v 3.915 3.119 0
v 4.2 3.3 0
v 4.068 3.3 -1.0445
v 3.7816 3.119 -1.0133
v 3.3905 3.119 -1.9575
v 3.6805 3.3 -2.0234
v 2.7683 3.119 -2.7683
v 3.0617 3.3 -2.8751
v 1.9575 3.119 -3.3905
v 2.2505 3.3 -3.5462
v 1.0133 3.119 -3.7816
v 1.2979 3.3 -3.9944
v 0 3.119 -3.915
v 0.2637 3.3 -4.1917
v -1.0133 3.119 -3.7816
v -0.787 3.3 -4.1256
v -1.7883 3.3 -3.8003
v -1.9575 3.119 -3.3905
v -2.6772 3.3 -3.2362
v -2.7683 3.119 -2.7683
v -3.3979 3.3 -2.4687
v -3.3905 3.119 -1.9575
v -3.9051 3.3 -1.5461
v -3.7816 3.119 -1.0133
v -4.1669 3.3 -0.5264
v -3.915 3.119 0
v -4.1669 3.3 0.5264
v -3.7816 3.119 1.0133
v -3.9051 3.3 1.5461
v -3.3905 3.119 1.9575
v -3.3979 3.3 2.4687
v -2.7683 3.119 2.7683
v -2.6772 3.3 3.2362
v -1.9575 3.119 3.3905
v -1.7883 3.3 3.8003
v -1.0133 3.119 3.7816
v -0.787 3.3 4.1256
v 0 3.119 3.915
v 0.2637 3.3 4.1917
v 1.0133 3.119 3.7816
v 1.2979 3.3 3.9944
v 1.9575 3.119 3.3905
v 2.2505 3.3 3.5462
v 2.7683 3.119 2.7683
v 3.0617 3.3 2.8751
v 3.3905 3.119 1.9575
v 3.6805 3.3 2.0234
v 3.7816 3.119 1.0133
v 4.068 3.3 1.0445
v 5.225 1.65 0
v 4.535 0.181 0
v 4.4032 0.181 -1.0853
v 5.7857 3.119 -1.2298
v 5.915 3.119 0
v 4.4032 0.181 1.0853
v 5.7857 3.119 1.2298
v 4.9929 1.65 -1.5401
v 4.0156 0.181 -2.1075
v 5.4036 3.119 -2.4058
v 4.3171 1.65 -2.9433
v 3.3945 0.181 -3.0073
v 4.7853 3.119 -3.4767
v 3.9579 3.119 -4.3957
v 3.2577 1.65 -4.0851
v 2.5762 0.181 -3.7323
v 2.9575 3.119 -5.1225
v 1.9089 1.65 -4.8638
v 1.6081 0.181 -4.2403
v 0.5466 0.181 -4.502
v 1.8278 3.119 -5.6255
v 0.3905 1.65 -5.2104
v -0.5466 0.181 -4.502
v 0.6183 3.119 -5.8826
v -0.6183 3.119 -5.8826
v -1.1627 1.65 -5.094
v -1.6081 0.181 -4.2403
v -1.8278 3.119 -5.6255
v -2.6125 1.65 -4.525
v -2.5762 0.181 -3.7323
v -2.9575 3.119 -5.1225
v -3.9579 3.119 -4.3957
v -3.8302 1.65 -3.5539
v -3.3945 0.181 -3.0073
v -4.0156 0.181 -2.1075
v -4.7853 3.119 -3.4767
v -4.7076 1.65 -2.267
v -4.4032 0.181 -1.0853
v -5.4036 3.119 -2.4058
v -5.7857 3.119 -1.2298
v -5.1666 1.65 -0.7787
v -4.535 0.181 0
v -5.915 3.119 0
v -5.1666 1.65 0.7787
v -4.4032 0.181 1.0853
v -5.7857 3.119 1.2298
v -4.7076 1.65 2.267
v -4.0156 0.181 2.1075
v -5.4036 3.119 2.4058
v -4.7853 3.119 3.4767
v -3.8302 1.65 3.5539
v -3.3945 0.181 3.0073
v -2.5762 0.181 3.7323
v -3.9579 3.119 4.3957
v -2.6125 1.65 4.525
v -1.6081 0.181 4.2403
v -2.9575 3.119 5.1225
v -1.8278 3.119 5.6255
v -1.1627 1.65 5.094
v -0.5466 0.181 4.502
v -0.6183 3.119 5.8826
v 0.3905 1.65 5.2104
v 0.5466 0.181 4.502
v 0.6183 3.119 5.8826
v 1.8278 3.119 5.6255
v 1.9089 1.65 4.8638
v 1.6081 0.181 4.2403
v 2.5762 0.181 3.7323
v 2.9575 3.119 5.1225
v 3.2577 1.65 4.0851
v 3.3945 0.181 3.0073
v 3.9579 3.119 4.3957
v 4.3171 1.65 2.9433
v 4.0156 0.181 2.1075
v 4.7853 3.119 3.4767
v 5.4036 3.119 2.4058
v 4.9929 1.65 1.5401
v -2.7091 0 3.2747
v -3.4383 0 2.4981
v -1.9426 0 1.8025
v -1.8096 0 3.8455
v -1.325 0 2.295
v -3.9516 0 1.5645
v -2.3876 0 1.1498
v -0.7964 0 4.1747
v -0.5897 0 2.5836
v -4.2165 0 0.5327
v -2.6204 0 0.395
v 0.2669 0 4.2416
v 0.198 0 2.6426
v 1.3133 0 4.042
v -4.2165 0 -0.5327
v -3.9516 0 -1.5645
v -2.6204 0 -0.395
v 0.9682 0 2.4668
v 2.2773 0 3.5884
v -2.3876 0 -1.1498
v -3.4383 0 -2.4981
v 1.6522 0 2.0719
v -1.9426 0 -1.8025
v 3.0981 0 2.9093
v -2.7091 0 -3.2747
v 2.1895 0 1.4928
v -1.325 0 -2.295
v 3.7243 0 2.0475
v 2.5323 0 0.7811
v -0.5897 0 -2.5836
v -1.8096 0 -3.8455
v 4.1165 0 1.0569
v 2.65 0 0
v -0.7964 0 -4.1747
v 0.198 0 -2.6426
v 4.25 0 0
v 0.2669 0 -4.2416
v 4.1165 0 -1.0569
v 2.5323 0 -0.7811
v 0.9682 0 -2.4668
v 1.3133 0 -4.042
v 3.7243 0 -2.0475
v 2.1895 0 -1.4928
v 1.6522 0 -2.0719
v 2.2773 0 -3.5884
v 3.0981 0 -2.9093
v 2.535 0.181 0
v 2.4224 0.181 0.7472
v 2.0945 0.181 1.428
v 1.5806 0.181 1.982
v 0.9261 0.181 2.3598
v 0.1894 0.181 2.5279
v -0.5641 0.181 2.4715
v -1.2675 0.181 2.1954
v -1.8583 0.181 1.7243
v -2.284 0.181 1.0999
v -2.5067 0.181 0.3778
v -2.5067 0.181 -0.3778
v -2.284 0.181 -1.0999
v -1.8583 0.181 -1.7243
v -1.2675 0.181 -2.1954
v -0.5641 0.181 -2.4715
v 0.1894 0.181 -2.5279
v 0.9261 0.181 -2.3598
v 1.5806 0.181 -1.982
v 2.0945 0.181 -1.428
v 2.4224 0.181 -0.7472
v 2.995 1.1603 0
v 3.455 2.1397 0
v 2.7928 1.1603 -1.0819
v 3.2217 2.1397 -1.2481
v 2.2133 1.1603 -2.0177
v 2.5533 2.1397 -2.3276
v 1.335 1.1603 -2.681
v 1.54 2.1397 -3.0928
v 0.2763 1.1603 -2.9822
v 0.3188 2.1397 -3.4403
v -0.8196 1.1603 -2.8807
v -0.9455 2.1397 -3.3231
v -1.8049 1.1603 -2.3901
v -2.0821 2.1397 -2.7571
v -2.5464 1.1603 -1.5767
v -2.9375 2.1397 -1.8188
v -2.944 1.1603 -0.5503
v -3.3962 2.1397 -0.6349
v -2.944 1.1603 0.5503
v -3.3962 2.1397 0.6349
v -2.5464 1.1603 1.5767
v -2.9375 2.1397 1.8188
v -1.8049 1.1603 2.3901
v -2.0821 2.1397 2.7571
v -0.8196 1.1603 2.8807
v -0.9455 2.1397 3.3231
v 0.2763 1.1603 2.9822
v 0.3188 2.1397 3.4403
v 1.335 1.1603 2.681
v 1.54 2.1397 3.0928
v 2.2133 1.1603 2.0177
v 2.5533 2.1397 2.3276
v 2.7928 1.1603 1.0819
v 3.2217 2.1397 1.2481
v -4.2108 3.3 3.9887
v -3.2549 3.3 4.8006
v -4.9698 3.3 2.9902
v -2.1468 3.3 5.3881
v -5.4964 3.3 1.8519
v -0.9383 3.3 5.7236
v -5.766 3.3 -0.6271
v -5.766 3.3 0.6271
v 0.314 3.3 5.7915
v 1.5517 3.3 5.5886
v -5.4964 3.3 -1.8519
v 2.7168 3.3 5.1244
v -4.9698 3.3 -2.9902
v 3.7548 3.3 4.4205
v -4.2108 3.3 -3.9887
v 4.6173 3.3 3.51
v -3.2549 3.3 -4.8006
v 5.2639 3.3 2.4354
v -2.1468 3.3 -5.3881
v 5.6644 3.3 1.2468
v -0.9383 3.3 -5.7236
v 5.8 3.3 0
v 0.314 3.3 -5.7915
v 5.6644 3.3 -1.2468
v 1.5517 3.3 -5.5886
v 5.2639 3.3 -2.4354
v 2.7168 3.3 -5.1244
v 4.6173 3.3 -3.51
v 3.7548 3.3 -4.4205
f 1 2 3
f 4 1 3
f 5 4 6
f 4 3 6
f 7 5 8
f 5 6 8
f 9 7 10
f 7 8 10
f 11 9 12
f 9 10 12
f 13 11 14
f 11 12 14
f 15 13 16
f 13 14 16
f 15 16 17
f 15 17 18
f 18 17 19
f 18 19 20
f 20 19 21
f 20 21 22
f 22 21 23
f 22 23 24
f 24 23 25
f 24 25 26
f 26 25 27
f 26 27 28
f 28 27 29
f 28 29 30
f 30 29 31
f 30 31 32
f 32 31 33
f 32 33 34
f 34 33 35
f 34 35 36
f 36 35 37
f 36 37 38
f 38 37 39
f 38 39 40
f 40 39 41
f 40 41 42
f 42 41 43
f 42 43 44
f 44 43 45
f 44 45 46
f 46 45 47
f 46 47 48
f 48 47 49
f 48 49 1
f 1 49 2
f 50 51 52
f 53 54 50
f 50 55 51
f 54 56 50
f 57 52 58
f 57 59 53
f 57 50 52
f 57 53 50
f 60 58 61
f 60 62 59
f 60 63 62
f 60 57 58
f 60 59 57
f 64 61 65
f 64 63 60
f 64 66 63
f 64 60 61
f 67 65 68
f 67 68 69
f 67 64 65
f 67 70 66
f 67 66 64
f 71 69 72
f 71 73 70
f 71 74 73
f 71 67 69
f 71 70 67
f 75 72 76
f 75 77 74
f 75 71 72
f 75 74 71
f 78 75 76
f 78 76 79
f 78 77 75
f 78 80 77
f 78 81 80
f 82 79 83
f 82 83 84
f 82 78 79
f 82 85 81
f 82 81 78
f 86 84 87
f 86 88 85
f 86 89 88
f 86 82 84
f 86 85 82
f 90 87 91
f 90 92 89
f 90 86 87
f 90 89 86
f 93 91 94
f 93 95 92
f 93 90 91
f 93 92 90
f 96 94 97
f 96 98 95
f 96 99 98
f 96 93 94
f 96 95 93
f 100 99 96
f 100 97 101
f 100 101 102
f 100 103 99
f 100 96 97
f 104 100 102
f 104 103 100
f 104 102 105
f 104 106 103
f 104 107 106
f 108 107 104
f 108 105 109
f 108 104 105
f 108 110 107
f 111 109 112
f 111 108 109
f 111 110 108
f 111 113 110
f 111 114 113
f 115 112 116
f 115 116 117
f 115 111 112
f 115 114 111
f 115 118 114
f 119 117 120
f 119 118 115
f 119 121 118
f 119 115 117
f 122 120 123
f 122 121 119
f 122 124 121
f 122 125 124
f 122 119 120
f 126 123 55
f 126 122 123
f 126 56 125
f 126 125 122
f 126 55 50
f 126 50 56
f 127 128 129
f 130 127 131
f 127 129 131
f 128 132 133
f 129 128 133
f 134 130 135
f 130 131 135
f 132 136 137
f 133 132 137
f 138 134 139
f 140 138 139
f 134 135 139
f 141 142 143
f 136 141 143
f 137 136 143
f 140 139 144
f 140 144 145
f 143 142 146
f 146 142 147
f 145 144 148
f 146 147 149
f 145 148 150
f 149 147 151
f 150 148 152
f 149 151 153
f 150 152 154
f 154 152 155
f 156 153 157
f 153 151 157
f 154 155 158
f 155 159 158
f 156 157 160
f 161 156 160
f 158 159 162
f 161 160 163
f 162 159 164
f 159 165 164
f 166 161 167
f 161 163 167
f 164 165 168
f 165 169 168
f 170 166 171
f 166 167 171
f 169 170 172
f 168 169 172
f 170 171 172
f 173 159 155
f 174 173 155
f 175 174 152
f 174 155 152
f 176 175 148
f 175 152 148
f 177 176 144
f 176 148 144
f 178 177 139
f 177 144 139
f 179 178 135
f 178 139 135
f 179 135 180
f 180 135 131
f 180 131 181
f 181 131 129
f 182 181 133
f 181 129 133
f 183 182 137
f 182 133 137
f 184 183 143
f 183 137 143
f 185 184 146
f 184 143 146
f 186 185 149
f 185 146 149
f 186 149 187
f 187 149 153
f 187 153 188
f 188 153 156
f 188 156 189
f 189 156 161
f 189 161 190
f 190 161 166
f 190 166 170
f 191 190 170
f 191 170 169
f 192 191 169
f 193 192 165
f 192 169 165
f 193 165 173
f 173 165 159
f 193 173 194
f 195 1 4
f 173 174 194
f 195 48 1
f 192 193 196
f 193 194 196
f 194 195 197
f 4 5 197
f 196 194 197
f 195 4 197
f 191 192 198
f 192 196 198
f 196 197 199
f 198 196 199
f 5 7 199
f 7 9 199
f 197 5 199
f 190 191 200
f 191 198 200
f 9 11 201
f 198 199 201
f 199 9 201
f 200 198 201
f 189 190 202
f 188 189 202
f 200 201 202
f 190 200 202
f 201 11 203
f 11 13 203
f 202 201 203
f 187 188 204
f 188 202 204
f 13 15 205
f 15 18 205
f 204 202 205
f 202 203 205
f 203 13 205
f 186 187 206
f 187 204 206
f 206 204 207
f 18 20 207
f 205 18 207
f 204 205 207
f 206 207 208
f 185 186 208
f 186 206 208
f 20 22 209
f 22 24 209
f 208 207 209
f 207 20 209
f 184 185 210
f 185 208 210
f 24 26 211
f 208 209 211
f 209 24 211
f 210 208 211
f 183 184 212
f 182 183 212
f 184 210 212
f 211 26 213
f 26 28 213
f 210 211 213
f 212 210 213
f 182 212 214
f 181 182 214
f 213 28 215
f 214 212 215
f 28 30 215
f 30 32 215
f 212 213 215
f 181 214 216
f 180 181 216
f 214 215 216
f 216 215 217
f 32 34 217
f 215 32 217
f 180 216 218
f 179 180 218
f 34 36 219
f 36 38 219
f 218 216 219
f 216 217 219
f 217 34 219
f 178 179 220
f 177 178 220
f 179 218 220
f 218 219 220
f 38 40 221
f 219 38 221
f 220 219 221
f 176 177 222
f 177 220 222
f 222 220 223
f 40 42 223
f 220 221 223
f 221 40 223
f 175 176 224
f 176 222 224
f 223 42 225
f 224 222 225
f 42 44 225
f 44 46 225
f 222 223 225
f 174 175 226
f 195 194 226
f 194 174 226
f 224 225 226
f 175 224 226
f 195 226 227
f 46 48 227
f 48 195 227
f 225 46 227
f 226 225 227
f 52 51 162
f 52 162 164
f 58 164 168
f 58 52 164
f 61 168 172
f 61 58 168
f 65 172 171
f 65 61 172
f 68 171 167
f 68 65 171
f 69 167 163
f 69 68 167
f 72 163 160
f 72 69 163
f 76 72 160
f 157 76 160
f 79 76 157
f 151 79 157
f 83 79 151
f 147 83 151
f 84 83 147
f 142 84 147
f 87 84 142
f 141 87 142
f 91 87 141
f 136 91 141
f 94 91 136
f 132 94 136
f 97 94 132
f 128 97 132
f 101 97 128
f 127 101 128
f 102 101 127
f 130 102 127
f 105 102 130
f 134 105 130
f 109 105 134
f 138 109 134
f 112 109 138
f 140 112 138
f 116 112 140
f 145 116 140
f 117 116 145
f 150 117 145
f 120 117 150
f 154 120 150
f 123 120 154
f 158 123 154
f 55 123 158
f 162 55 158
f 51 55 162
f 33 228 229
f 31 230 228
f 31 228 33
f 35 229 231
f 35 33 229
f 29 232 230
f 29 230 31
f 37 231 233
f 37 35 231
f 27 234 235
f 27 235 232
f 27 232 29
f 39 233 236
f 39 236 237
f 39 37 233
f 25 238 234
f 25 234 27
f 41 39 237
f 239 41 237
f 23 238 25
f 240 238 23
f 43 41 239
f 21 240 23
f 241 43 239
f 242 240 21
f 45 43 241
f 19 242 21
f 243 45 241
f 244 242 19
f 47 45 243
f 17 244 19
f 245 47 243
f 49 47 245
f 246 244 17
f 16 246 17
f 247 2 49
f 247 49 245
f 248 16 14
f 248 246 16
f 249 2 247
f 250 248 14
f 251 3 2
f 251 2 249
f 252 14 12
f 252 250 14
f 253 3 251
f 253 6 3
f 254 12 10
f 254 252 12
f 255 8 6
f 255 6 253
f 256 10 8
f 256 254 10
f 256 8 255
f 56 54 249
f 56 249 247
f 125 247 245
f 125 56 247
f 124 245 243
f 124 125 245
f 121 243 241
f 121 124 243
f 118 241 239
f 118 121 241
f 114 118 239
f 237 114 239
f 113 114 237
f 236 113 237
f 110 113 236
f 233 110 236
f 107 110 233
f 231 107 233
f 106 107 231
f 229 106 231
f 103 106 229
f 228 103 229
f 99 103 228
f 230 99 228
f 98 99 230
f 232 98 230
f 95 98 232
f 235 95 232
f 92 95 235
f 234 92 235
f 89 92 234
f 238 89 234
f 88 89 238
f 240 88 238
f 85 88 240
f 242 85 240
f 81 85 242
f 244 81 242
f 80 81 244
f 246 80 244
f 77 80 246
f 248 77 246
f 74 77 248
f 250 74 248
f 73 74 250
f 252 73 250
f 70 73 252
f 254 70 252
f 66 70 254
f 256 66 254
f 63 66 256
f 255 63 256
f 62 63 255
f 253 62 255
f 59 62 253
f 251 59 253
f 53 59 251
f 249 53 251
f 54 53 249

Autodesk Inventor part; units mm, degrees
ref_plane "YZ Plane" through (0, 0, 0) normal (1, 0, 0) x (0, 1, 0)
ref_plane "XZ Plane" through (0, 0, 0) normal (0, 1, 0) x (-1, 0, 0)
ref_plane "XY Plane" through (0, 0, 0) normal (0, 0, 1) x (1, 0, 0)
sketch "Sketch1" plane through (0, 0, 0) normal (0, 0, 1) x (1, 0, 0)
  line L0 (0, 0) -> (0, 3.3)
  line L1 (2.45, 0) -> (4.45, 0)
  line L2 (4.45, 0) -> (6, 3.3)
  line L3 (6, 3.3) -> (4, 3.3)
  line L4 (4, 3.3) -> (2.45, 0)
  point P0 (3.45, 0)
  point P1 (5, 3.3)
  dimension "d1" = 3.3
  dimension "d3" = 2
  dimension "d5" = 8
  dimension "d6" = 4.9
revolve "Revolution1" add sketch "Sketch1" angle 360 about axis through (0, 0, 0) along (0, 1, 0)
chamfer "Chamfer1" distance 0.2 angle 45 4 edges at (-6, 3.3, 0) (-4.45, 0, 0) (-4, 3.3, 0) (-2.45, 0, 0)
properties part number "Washer"
